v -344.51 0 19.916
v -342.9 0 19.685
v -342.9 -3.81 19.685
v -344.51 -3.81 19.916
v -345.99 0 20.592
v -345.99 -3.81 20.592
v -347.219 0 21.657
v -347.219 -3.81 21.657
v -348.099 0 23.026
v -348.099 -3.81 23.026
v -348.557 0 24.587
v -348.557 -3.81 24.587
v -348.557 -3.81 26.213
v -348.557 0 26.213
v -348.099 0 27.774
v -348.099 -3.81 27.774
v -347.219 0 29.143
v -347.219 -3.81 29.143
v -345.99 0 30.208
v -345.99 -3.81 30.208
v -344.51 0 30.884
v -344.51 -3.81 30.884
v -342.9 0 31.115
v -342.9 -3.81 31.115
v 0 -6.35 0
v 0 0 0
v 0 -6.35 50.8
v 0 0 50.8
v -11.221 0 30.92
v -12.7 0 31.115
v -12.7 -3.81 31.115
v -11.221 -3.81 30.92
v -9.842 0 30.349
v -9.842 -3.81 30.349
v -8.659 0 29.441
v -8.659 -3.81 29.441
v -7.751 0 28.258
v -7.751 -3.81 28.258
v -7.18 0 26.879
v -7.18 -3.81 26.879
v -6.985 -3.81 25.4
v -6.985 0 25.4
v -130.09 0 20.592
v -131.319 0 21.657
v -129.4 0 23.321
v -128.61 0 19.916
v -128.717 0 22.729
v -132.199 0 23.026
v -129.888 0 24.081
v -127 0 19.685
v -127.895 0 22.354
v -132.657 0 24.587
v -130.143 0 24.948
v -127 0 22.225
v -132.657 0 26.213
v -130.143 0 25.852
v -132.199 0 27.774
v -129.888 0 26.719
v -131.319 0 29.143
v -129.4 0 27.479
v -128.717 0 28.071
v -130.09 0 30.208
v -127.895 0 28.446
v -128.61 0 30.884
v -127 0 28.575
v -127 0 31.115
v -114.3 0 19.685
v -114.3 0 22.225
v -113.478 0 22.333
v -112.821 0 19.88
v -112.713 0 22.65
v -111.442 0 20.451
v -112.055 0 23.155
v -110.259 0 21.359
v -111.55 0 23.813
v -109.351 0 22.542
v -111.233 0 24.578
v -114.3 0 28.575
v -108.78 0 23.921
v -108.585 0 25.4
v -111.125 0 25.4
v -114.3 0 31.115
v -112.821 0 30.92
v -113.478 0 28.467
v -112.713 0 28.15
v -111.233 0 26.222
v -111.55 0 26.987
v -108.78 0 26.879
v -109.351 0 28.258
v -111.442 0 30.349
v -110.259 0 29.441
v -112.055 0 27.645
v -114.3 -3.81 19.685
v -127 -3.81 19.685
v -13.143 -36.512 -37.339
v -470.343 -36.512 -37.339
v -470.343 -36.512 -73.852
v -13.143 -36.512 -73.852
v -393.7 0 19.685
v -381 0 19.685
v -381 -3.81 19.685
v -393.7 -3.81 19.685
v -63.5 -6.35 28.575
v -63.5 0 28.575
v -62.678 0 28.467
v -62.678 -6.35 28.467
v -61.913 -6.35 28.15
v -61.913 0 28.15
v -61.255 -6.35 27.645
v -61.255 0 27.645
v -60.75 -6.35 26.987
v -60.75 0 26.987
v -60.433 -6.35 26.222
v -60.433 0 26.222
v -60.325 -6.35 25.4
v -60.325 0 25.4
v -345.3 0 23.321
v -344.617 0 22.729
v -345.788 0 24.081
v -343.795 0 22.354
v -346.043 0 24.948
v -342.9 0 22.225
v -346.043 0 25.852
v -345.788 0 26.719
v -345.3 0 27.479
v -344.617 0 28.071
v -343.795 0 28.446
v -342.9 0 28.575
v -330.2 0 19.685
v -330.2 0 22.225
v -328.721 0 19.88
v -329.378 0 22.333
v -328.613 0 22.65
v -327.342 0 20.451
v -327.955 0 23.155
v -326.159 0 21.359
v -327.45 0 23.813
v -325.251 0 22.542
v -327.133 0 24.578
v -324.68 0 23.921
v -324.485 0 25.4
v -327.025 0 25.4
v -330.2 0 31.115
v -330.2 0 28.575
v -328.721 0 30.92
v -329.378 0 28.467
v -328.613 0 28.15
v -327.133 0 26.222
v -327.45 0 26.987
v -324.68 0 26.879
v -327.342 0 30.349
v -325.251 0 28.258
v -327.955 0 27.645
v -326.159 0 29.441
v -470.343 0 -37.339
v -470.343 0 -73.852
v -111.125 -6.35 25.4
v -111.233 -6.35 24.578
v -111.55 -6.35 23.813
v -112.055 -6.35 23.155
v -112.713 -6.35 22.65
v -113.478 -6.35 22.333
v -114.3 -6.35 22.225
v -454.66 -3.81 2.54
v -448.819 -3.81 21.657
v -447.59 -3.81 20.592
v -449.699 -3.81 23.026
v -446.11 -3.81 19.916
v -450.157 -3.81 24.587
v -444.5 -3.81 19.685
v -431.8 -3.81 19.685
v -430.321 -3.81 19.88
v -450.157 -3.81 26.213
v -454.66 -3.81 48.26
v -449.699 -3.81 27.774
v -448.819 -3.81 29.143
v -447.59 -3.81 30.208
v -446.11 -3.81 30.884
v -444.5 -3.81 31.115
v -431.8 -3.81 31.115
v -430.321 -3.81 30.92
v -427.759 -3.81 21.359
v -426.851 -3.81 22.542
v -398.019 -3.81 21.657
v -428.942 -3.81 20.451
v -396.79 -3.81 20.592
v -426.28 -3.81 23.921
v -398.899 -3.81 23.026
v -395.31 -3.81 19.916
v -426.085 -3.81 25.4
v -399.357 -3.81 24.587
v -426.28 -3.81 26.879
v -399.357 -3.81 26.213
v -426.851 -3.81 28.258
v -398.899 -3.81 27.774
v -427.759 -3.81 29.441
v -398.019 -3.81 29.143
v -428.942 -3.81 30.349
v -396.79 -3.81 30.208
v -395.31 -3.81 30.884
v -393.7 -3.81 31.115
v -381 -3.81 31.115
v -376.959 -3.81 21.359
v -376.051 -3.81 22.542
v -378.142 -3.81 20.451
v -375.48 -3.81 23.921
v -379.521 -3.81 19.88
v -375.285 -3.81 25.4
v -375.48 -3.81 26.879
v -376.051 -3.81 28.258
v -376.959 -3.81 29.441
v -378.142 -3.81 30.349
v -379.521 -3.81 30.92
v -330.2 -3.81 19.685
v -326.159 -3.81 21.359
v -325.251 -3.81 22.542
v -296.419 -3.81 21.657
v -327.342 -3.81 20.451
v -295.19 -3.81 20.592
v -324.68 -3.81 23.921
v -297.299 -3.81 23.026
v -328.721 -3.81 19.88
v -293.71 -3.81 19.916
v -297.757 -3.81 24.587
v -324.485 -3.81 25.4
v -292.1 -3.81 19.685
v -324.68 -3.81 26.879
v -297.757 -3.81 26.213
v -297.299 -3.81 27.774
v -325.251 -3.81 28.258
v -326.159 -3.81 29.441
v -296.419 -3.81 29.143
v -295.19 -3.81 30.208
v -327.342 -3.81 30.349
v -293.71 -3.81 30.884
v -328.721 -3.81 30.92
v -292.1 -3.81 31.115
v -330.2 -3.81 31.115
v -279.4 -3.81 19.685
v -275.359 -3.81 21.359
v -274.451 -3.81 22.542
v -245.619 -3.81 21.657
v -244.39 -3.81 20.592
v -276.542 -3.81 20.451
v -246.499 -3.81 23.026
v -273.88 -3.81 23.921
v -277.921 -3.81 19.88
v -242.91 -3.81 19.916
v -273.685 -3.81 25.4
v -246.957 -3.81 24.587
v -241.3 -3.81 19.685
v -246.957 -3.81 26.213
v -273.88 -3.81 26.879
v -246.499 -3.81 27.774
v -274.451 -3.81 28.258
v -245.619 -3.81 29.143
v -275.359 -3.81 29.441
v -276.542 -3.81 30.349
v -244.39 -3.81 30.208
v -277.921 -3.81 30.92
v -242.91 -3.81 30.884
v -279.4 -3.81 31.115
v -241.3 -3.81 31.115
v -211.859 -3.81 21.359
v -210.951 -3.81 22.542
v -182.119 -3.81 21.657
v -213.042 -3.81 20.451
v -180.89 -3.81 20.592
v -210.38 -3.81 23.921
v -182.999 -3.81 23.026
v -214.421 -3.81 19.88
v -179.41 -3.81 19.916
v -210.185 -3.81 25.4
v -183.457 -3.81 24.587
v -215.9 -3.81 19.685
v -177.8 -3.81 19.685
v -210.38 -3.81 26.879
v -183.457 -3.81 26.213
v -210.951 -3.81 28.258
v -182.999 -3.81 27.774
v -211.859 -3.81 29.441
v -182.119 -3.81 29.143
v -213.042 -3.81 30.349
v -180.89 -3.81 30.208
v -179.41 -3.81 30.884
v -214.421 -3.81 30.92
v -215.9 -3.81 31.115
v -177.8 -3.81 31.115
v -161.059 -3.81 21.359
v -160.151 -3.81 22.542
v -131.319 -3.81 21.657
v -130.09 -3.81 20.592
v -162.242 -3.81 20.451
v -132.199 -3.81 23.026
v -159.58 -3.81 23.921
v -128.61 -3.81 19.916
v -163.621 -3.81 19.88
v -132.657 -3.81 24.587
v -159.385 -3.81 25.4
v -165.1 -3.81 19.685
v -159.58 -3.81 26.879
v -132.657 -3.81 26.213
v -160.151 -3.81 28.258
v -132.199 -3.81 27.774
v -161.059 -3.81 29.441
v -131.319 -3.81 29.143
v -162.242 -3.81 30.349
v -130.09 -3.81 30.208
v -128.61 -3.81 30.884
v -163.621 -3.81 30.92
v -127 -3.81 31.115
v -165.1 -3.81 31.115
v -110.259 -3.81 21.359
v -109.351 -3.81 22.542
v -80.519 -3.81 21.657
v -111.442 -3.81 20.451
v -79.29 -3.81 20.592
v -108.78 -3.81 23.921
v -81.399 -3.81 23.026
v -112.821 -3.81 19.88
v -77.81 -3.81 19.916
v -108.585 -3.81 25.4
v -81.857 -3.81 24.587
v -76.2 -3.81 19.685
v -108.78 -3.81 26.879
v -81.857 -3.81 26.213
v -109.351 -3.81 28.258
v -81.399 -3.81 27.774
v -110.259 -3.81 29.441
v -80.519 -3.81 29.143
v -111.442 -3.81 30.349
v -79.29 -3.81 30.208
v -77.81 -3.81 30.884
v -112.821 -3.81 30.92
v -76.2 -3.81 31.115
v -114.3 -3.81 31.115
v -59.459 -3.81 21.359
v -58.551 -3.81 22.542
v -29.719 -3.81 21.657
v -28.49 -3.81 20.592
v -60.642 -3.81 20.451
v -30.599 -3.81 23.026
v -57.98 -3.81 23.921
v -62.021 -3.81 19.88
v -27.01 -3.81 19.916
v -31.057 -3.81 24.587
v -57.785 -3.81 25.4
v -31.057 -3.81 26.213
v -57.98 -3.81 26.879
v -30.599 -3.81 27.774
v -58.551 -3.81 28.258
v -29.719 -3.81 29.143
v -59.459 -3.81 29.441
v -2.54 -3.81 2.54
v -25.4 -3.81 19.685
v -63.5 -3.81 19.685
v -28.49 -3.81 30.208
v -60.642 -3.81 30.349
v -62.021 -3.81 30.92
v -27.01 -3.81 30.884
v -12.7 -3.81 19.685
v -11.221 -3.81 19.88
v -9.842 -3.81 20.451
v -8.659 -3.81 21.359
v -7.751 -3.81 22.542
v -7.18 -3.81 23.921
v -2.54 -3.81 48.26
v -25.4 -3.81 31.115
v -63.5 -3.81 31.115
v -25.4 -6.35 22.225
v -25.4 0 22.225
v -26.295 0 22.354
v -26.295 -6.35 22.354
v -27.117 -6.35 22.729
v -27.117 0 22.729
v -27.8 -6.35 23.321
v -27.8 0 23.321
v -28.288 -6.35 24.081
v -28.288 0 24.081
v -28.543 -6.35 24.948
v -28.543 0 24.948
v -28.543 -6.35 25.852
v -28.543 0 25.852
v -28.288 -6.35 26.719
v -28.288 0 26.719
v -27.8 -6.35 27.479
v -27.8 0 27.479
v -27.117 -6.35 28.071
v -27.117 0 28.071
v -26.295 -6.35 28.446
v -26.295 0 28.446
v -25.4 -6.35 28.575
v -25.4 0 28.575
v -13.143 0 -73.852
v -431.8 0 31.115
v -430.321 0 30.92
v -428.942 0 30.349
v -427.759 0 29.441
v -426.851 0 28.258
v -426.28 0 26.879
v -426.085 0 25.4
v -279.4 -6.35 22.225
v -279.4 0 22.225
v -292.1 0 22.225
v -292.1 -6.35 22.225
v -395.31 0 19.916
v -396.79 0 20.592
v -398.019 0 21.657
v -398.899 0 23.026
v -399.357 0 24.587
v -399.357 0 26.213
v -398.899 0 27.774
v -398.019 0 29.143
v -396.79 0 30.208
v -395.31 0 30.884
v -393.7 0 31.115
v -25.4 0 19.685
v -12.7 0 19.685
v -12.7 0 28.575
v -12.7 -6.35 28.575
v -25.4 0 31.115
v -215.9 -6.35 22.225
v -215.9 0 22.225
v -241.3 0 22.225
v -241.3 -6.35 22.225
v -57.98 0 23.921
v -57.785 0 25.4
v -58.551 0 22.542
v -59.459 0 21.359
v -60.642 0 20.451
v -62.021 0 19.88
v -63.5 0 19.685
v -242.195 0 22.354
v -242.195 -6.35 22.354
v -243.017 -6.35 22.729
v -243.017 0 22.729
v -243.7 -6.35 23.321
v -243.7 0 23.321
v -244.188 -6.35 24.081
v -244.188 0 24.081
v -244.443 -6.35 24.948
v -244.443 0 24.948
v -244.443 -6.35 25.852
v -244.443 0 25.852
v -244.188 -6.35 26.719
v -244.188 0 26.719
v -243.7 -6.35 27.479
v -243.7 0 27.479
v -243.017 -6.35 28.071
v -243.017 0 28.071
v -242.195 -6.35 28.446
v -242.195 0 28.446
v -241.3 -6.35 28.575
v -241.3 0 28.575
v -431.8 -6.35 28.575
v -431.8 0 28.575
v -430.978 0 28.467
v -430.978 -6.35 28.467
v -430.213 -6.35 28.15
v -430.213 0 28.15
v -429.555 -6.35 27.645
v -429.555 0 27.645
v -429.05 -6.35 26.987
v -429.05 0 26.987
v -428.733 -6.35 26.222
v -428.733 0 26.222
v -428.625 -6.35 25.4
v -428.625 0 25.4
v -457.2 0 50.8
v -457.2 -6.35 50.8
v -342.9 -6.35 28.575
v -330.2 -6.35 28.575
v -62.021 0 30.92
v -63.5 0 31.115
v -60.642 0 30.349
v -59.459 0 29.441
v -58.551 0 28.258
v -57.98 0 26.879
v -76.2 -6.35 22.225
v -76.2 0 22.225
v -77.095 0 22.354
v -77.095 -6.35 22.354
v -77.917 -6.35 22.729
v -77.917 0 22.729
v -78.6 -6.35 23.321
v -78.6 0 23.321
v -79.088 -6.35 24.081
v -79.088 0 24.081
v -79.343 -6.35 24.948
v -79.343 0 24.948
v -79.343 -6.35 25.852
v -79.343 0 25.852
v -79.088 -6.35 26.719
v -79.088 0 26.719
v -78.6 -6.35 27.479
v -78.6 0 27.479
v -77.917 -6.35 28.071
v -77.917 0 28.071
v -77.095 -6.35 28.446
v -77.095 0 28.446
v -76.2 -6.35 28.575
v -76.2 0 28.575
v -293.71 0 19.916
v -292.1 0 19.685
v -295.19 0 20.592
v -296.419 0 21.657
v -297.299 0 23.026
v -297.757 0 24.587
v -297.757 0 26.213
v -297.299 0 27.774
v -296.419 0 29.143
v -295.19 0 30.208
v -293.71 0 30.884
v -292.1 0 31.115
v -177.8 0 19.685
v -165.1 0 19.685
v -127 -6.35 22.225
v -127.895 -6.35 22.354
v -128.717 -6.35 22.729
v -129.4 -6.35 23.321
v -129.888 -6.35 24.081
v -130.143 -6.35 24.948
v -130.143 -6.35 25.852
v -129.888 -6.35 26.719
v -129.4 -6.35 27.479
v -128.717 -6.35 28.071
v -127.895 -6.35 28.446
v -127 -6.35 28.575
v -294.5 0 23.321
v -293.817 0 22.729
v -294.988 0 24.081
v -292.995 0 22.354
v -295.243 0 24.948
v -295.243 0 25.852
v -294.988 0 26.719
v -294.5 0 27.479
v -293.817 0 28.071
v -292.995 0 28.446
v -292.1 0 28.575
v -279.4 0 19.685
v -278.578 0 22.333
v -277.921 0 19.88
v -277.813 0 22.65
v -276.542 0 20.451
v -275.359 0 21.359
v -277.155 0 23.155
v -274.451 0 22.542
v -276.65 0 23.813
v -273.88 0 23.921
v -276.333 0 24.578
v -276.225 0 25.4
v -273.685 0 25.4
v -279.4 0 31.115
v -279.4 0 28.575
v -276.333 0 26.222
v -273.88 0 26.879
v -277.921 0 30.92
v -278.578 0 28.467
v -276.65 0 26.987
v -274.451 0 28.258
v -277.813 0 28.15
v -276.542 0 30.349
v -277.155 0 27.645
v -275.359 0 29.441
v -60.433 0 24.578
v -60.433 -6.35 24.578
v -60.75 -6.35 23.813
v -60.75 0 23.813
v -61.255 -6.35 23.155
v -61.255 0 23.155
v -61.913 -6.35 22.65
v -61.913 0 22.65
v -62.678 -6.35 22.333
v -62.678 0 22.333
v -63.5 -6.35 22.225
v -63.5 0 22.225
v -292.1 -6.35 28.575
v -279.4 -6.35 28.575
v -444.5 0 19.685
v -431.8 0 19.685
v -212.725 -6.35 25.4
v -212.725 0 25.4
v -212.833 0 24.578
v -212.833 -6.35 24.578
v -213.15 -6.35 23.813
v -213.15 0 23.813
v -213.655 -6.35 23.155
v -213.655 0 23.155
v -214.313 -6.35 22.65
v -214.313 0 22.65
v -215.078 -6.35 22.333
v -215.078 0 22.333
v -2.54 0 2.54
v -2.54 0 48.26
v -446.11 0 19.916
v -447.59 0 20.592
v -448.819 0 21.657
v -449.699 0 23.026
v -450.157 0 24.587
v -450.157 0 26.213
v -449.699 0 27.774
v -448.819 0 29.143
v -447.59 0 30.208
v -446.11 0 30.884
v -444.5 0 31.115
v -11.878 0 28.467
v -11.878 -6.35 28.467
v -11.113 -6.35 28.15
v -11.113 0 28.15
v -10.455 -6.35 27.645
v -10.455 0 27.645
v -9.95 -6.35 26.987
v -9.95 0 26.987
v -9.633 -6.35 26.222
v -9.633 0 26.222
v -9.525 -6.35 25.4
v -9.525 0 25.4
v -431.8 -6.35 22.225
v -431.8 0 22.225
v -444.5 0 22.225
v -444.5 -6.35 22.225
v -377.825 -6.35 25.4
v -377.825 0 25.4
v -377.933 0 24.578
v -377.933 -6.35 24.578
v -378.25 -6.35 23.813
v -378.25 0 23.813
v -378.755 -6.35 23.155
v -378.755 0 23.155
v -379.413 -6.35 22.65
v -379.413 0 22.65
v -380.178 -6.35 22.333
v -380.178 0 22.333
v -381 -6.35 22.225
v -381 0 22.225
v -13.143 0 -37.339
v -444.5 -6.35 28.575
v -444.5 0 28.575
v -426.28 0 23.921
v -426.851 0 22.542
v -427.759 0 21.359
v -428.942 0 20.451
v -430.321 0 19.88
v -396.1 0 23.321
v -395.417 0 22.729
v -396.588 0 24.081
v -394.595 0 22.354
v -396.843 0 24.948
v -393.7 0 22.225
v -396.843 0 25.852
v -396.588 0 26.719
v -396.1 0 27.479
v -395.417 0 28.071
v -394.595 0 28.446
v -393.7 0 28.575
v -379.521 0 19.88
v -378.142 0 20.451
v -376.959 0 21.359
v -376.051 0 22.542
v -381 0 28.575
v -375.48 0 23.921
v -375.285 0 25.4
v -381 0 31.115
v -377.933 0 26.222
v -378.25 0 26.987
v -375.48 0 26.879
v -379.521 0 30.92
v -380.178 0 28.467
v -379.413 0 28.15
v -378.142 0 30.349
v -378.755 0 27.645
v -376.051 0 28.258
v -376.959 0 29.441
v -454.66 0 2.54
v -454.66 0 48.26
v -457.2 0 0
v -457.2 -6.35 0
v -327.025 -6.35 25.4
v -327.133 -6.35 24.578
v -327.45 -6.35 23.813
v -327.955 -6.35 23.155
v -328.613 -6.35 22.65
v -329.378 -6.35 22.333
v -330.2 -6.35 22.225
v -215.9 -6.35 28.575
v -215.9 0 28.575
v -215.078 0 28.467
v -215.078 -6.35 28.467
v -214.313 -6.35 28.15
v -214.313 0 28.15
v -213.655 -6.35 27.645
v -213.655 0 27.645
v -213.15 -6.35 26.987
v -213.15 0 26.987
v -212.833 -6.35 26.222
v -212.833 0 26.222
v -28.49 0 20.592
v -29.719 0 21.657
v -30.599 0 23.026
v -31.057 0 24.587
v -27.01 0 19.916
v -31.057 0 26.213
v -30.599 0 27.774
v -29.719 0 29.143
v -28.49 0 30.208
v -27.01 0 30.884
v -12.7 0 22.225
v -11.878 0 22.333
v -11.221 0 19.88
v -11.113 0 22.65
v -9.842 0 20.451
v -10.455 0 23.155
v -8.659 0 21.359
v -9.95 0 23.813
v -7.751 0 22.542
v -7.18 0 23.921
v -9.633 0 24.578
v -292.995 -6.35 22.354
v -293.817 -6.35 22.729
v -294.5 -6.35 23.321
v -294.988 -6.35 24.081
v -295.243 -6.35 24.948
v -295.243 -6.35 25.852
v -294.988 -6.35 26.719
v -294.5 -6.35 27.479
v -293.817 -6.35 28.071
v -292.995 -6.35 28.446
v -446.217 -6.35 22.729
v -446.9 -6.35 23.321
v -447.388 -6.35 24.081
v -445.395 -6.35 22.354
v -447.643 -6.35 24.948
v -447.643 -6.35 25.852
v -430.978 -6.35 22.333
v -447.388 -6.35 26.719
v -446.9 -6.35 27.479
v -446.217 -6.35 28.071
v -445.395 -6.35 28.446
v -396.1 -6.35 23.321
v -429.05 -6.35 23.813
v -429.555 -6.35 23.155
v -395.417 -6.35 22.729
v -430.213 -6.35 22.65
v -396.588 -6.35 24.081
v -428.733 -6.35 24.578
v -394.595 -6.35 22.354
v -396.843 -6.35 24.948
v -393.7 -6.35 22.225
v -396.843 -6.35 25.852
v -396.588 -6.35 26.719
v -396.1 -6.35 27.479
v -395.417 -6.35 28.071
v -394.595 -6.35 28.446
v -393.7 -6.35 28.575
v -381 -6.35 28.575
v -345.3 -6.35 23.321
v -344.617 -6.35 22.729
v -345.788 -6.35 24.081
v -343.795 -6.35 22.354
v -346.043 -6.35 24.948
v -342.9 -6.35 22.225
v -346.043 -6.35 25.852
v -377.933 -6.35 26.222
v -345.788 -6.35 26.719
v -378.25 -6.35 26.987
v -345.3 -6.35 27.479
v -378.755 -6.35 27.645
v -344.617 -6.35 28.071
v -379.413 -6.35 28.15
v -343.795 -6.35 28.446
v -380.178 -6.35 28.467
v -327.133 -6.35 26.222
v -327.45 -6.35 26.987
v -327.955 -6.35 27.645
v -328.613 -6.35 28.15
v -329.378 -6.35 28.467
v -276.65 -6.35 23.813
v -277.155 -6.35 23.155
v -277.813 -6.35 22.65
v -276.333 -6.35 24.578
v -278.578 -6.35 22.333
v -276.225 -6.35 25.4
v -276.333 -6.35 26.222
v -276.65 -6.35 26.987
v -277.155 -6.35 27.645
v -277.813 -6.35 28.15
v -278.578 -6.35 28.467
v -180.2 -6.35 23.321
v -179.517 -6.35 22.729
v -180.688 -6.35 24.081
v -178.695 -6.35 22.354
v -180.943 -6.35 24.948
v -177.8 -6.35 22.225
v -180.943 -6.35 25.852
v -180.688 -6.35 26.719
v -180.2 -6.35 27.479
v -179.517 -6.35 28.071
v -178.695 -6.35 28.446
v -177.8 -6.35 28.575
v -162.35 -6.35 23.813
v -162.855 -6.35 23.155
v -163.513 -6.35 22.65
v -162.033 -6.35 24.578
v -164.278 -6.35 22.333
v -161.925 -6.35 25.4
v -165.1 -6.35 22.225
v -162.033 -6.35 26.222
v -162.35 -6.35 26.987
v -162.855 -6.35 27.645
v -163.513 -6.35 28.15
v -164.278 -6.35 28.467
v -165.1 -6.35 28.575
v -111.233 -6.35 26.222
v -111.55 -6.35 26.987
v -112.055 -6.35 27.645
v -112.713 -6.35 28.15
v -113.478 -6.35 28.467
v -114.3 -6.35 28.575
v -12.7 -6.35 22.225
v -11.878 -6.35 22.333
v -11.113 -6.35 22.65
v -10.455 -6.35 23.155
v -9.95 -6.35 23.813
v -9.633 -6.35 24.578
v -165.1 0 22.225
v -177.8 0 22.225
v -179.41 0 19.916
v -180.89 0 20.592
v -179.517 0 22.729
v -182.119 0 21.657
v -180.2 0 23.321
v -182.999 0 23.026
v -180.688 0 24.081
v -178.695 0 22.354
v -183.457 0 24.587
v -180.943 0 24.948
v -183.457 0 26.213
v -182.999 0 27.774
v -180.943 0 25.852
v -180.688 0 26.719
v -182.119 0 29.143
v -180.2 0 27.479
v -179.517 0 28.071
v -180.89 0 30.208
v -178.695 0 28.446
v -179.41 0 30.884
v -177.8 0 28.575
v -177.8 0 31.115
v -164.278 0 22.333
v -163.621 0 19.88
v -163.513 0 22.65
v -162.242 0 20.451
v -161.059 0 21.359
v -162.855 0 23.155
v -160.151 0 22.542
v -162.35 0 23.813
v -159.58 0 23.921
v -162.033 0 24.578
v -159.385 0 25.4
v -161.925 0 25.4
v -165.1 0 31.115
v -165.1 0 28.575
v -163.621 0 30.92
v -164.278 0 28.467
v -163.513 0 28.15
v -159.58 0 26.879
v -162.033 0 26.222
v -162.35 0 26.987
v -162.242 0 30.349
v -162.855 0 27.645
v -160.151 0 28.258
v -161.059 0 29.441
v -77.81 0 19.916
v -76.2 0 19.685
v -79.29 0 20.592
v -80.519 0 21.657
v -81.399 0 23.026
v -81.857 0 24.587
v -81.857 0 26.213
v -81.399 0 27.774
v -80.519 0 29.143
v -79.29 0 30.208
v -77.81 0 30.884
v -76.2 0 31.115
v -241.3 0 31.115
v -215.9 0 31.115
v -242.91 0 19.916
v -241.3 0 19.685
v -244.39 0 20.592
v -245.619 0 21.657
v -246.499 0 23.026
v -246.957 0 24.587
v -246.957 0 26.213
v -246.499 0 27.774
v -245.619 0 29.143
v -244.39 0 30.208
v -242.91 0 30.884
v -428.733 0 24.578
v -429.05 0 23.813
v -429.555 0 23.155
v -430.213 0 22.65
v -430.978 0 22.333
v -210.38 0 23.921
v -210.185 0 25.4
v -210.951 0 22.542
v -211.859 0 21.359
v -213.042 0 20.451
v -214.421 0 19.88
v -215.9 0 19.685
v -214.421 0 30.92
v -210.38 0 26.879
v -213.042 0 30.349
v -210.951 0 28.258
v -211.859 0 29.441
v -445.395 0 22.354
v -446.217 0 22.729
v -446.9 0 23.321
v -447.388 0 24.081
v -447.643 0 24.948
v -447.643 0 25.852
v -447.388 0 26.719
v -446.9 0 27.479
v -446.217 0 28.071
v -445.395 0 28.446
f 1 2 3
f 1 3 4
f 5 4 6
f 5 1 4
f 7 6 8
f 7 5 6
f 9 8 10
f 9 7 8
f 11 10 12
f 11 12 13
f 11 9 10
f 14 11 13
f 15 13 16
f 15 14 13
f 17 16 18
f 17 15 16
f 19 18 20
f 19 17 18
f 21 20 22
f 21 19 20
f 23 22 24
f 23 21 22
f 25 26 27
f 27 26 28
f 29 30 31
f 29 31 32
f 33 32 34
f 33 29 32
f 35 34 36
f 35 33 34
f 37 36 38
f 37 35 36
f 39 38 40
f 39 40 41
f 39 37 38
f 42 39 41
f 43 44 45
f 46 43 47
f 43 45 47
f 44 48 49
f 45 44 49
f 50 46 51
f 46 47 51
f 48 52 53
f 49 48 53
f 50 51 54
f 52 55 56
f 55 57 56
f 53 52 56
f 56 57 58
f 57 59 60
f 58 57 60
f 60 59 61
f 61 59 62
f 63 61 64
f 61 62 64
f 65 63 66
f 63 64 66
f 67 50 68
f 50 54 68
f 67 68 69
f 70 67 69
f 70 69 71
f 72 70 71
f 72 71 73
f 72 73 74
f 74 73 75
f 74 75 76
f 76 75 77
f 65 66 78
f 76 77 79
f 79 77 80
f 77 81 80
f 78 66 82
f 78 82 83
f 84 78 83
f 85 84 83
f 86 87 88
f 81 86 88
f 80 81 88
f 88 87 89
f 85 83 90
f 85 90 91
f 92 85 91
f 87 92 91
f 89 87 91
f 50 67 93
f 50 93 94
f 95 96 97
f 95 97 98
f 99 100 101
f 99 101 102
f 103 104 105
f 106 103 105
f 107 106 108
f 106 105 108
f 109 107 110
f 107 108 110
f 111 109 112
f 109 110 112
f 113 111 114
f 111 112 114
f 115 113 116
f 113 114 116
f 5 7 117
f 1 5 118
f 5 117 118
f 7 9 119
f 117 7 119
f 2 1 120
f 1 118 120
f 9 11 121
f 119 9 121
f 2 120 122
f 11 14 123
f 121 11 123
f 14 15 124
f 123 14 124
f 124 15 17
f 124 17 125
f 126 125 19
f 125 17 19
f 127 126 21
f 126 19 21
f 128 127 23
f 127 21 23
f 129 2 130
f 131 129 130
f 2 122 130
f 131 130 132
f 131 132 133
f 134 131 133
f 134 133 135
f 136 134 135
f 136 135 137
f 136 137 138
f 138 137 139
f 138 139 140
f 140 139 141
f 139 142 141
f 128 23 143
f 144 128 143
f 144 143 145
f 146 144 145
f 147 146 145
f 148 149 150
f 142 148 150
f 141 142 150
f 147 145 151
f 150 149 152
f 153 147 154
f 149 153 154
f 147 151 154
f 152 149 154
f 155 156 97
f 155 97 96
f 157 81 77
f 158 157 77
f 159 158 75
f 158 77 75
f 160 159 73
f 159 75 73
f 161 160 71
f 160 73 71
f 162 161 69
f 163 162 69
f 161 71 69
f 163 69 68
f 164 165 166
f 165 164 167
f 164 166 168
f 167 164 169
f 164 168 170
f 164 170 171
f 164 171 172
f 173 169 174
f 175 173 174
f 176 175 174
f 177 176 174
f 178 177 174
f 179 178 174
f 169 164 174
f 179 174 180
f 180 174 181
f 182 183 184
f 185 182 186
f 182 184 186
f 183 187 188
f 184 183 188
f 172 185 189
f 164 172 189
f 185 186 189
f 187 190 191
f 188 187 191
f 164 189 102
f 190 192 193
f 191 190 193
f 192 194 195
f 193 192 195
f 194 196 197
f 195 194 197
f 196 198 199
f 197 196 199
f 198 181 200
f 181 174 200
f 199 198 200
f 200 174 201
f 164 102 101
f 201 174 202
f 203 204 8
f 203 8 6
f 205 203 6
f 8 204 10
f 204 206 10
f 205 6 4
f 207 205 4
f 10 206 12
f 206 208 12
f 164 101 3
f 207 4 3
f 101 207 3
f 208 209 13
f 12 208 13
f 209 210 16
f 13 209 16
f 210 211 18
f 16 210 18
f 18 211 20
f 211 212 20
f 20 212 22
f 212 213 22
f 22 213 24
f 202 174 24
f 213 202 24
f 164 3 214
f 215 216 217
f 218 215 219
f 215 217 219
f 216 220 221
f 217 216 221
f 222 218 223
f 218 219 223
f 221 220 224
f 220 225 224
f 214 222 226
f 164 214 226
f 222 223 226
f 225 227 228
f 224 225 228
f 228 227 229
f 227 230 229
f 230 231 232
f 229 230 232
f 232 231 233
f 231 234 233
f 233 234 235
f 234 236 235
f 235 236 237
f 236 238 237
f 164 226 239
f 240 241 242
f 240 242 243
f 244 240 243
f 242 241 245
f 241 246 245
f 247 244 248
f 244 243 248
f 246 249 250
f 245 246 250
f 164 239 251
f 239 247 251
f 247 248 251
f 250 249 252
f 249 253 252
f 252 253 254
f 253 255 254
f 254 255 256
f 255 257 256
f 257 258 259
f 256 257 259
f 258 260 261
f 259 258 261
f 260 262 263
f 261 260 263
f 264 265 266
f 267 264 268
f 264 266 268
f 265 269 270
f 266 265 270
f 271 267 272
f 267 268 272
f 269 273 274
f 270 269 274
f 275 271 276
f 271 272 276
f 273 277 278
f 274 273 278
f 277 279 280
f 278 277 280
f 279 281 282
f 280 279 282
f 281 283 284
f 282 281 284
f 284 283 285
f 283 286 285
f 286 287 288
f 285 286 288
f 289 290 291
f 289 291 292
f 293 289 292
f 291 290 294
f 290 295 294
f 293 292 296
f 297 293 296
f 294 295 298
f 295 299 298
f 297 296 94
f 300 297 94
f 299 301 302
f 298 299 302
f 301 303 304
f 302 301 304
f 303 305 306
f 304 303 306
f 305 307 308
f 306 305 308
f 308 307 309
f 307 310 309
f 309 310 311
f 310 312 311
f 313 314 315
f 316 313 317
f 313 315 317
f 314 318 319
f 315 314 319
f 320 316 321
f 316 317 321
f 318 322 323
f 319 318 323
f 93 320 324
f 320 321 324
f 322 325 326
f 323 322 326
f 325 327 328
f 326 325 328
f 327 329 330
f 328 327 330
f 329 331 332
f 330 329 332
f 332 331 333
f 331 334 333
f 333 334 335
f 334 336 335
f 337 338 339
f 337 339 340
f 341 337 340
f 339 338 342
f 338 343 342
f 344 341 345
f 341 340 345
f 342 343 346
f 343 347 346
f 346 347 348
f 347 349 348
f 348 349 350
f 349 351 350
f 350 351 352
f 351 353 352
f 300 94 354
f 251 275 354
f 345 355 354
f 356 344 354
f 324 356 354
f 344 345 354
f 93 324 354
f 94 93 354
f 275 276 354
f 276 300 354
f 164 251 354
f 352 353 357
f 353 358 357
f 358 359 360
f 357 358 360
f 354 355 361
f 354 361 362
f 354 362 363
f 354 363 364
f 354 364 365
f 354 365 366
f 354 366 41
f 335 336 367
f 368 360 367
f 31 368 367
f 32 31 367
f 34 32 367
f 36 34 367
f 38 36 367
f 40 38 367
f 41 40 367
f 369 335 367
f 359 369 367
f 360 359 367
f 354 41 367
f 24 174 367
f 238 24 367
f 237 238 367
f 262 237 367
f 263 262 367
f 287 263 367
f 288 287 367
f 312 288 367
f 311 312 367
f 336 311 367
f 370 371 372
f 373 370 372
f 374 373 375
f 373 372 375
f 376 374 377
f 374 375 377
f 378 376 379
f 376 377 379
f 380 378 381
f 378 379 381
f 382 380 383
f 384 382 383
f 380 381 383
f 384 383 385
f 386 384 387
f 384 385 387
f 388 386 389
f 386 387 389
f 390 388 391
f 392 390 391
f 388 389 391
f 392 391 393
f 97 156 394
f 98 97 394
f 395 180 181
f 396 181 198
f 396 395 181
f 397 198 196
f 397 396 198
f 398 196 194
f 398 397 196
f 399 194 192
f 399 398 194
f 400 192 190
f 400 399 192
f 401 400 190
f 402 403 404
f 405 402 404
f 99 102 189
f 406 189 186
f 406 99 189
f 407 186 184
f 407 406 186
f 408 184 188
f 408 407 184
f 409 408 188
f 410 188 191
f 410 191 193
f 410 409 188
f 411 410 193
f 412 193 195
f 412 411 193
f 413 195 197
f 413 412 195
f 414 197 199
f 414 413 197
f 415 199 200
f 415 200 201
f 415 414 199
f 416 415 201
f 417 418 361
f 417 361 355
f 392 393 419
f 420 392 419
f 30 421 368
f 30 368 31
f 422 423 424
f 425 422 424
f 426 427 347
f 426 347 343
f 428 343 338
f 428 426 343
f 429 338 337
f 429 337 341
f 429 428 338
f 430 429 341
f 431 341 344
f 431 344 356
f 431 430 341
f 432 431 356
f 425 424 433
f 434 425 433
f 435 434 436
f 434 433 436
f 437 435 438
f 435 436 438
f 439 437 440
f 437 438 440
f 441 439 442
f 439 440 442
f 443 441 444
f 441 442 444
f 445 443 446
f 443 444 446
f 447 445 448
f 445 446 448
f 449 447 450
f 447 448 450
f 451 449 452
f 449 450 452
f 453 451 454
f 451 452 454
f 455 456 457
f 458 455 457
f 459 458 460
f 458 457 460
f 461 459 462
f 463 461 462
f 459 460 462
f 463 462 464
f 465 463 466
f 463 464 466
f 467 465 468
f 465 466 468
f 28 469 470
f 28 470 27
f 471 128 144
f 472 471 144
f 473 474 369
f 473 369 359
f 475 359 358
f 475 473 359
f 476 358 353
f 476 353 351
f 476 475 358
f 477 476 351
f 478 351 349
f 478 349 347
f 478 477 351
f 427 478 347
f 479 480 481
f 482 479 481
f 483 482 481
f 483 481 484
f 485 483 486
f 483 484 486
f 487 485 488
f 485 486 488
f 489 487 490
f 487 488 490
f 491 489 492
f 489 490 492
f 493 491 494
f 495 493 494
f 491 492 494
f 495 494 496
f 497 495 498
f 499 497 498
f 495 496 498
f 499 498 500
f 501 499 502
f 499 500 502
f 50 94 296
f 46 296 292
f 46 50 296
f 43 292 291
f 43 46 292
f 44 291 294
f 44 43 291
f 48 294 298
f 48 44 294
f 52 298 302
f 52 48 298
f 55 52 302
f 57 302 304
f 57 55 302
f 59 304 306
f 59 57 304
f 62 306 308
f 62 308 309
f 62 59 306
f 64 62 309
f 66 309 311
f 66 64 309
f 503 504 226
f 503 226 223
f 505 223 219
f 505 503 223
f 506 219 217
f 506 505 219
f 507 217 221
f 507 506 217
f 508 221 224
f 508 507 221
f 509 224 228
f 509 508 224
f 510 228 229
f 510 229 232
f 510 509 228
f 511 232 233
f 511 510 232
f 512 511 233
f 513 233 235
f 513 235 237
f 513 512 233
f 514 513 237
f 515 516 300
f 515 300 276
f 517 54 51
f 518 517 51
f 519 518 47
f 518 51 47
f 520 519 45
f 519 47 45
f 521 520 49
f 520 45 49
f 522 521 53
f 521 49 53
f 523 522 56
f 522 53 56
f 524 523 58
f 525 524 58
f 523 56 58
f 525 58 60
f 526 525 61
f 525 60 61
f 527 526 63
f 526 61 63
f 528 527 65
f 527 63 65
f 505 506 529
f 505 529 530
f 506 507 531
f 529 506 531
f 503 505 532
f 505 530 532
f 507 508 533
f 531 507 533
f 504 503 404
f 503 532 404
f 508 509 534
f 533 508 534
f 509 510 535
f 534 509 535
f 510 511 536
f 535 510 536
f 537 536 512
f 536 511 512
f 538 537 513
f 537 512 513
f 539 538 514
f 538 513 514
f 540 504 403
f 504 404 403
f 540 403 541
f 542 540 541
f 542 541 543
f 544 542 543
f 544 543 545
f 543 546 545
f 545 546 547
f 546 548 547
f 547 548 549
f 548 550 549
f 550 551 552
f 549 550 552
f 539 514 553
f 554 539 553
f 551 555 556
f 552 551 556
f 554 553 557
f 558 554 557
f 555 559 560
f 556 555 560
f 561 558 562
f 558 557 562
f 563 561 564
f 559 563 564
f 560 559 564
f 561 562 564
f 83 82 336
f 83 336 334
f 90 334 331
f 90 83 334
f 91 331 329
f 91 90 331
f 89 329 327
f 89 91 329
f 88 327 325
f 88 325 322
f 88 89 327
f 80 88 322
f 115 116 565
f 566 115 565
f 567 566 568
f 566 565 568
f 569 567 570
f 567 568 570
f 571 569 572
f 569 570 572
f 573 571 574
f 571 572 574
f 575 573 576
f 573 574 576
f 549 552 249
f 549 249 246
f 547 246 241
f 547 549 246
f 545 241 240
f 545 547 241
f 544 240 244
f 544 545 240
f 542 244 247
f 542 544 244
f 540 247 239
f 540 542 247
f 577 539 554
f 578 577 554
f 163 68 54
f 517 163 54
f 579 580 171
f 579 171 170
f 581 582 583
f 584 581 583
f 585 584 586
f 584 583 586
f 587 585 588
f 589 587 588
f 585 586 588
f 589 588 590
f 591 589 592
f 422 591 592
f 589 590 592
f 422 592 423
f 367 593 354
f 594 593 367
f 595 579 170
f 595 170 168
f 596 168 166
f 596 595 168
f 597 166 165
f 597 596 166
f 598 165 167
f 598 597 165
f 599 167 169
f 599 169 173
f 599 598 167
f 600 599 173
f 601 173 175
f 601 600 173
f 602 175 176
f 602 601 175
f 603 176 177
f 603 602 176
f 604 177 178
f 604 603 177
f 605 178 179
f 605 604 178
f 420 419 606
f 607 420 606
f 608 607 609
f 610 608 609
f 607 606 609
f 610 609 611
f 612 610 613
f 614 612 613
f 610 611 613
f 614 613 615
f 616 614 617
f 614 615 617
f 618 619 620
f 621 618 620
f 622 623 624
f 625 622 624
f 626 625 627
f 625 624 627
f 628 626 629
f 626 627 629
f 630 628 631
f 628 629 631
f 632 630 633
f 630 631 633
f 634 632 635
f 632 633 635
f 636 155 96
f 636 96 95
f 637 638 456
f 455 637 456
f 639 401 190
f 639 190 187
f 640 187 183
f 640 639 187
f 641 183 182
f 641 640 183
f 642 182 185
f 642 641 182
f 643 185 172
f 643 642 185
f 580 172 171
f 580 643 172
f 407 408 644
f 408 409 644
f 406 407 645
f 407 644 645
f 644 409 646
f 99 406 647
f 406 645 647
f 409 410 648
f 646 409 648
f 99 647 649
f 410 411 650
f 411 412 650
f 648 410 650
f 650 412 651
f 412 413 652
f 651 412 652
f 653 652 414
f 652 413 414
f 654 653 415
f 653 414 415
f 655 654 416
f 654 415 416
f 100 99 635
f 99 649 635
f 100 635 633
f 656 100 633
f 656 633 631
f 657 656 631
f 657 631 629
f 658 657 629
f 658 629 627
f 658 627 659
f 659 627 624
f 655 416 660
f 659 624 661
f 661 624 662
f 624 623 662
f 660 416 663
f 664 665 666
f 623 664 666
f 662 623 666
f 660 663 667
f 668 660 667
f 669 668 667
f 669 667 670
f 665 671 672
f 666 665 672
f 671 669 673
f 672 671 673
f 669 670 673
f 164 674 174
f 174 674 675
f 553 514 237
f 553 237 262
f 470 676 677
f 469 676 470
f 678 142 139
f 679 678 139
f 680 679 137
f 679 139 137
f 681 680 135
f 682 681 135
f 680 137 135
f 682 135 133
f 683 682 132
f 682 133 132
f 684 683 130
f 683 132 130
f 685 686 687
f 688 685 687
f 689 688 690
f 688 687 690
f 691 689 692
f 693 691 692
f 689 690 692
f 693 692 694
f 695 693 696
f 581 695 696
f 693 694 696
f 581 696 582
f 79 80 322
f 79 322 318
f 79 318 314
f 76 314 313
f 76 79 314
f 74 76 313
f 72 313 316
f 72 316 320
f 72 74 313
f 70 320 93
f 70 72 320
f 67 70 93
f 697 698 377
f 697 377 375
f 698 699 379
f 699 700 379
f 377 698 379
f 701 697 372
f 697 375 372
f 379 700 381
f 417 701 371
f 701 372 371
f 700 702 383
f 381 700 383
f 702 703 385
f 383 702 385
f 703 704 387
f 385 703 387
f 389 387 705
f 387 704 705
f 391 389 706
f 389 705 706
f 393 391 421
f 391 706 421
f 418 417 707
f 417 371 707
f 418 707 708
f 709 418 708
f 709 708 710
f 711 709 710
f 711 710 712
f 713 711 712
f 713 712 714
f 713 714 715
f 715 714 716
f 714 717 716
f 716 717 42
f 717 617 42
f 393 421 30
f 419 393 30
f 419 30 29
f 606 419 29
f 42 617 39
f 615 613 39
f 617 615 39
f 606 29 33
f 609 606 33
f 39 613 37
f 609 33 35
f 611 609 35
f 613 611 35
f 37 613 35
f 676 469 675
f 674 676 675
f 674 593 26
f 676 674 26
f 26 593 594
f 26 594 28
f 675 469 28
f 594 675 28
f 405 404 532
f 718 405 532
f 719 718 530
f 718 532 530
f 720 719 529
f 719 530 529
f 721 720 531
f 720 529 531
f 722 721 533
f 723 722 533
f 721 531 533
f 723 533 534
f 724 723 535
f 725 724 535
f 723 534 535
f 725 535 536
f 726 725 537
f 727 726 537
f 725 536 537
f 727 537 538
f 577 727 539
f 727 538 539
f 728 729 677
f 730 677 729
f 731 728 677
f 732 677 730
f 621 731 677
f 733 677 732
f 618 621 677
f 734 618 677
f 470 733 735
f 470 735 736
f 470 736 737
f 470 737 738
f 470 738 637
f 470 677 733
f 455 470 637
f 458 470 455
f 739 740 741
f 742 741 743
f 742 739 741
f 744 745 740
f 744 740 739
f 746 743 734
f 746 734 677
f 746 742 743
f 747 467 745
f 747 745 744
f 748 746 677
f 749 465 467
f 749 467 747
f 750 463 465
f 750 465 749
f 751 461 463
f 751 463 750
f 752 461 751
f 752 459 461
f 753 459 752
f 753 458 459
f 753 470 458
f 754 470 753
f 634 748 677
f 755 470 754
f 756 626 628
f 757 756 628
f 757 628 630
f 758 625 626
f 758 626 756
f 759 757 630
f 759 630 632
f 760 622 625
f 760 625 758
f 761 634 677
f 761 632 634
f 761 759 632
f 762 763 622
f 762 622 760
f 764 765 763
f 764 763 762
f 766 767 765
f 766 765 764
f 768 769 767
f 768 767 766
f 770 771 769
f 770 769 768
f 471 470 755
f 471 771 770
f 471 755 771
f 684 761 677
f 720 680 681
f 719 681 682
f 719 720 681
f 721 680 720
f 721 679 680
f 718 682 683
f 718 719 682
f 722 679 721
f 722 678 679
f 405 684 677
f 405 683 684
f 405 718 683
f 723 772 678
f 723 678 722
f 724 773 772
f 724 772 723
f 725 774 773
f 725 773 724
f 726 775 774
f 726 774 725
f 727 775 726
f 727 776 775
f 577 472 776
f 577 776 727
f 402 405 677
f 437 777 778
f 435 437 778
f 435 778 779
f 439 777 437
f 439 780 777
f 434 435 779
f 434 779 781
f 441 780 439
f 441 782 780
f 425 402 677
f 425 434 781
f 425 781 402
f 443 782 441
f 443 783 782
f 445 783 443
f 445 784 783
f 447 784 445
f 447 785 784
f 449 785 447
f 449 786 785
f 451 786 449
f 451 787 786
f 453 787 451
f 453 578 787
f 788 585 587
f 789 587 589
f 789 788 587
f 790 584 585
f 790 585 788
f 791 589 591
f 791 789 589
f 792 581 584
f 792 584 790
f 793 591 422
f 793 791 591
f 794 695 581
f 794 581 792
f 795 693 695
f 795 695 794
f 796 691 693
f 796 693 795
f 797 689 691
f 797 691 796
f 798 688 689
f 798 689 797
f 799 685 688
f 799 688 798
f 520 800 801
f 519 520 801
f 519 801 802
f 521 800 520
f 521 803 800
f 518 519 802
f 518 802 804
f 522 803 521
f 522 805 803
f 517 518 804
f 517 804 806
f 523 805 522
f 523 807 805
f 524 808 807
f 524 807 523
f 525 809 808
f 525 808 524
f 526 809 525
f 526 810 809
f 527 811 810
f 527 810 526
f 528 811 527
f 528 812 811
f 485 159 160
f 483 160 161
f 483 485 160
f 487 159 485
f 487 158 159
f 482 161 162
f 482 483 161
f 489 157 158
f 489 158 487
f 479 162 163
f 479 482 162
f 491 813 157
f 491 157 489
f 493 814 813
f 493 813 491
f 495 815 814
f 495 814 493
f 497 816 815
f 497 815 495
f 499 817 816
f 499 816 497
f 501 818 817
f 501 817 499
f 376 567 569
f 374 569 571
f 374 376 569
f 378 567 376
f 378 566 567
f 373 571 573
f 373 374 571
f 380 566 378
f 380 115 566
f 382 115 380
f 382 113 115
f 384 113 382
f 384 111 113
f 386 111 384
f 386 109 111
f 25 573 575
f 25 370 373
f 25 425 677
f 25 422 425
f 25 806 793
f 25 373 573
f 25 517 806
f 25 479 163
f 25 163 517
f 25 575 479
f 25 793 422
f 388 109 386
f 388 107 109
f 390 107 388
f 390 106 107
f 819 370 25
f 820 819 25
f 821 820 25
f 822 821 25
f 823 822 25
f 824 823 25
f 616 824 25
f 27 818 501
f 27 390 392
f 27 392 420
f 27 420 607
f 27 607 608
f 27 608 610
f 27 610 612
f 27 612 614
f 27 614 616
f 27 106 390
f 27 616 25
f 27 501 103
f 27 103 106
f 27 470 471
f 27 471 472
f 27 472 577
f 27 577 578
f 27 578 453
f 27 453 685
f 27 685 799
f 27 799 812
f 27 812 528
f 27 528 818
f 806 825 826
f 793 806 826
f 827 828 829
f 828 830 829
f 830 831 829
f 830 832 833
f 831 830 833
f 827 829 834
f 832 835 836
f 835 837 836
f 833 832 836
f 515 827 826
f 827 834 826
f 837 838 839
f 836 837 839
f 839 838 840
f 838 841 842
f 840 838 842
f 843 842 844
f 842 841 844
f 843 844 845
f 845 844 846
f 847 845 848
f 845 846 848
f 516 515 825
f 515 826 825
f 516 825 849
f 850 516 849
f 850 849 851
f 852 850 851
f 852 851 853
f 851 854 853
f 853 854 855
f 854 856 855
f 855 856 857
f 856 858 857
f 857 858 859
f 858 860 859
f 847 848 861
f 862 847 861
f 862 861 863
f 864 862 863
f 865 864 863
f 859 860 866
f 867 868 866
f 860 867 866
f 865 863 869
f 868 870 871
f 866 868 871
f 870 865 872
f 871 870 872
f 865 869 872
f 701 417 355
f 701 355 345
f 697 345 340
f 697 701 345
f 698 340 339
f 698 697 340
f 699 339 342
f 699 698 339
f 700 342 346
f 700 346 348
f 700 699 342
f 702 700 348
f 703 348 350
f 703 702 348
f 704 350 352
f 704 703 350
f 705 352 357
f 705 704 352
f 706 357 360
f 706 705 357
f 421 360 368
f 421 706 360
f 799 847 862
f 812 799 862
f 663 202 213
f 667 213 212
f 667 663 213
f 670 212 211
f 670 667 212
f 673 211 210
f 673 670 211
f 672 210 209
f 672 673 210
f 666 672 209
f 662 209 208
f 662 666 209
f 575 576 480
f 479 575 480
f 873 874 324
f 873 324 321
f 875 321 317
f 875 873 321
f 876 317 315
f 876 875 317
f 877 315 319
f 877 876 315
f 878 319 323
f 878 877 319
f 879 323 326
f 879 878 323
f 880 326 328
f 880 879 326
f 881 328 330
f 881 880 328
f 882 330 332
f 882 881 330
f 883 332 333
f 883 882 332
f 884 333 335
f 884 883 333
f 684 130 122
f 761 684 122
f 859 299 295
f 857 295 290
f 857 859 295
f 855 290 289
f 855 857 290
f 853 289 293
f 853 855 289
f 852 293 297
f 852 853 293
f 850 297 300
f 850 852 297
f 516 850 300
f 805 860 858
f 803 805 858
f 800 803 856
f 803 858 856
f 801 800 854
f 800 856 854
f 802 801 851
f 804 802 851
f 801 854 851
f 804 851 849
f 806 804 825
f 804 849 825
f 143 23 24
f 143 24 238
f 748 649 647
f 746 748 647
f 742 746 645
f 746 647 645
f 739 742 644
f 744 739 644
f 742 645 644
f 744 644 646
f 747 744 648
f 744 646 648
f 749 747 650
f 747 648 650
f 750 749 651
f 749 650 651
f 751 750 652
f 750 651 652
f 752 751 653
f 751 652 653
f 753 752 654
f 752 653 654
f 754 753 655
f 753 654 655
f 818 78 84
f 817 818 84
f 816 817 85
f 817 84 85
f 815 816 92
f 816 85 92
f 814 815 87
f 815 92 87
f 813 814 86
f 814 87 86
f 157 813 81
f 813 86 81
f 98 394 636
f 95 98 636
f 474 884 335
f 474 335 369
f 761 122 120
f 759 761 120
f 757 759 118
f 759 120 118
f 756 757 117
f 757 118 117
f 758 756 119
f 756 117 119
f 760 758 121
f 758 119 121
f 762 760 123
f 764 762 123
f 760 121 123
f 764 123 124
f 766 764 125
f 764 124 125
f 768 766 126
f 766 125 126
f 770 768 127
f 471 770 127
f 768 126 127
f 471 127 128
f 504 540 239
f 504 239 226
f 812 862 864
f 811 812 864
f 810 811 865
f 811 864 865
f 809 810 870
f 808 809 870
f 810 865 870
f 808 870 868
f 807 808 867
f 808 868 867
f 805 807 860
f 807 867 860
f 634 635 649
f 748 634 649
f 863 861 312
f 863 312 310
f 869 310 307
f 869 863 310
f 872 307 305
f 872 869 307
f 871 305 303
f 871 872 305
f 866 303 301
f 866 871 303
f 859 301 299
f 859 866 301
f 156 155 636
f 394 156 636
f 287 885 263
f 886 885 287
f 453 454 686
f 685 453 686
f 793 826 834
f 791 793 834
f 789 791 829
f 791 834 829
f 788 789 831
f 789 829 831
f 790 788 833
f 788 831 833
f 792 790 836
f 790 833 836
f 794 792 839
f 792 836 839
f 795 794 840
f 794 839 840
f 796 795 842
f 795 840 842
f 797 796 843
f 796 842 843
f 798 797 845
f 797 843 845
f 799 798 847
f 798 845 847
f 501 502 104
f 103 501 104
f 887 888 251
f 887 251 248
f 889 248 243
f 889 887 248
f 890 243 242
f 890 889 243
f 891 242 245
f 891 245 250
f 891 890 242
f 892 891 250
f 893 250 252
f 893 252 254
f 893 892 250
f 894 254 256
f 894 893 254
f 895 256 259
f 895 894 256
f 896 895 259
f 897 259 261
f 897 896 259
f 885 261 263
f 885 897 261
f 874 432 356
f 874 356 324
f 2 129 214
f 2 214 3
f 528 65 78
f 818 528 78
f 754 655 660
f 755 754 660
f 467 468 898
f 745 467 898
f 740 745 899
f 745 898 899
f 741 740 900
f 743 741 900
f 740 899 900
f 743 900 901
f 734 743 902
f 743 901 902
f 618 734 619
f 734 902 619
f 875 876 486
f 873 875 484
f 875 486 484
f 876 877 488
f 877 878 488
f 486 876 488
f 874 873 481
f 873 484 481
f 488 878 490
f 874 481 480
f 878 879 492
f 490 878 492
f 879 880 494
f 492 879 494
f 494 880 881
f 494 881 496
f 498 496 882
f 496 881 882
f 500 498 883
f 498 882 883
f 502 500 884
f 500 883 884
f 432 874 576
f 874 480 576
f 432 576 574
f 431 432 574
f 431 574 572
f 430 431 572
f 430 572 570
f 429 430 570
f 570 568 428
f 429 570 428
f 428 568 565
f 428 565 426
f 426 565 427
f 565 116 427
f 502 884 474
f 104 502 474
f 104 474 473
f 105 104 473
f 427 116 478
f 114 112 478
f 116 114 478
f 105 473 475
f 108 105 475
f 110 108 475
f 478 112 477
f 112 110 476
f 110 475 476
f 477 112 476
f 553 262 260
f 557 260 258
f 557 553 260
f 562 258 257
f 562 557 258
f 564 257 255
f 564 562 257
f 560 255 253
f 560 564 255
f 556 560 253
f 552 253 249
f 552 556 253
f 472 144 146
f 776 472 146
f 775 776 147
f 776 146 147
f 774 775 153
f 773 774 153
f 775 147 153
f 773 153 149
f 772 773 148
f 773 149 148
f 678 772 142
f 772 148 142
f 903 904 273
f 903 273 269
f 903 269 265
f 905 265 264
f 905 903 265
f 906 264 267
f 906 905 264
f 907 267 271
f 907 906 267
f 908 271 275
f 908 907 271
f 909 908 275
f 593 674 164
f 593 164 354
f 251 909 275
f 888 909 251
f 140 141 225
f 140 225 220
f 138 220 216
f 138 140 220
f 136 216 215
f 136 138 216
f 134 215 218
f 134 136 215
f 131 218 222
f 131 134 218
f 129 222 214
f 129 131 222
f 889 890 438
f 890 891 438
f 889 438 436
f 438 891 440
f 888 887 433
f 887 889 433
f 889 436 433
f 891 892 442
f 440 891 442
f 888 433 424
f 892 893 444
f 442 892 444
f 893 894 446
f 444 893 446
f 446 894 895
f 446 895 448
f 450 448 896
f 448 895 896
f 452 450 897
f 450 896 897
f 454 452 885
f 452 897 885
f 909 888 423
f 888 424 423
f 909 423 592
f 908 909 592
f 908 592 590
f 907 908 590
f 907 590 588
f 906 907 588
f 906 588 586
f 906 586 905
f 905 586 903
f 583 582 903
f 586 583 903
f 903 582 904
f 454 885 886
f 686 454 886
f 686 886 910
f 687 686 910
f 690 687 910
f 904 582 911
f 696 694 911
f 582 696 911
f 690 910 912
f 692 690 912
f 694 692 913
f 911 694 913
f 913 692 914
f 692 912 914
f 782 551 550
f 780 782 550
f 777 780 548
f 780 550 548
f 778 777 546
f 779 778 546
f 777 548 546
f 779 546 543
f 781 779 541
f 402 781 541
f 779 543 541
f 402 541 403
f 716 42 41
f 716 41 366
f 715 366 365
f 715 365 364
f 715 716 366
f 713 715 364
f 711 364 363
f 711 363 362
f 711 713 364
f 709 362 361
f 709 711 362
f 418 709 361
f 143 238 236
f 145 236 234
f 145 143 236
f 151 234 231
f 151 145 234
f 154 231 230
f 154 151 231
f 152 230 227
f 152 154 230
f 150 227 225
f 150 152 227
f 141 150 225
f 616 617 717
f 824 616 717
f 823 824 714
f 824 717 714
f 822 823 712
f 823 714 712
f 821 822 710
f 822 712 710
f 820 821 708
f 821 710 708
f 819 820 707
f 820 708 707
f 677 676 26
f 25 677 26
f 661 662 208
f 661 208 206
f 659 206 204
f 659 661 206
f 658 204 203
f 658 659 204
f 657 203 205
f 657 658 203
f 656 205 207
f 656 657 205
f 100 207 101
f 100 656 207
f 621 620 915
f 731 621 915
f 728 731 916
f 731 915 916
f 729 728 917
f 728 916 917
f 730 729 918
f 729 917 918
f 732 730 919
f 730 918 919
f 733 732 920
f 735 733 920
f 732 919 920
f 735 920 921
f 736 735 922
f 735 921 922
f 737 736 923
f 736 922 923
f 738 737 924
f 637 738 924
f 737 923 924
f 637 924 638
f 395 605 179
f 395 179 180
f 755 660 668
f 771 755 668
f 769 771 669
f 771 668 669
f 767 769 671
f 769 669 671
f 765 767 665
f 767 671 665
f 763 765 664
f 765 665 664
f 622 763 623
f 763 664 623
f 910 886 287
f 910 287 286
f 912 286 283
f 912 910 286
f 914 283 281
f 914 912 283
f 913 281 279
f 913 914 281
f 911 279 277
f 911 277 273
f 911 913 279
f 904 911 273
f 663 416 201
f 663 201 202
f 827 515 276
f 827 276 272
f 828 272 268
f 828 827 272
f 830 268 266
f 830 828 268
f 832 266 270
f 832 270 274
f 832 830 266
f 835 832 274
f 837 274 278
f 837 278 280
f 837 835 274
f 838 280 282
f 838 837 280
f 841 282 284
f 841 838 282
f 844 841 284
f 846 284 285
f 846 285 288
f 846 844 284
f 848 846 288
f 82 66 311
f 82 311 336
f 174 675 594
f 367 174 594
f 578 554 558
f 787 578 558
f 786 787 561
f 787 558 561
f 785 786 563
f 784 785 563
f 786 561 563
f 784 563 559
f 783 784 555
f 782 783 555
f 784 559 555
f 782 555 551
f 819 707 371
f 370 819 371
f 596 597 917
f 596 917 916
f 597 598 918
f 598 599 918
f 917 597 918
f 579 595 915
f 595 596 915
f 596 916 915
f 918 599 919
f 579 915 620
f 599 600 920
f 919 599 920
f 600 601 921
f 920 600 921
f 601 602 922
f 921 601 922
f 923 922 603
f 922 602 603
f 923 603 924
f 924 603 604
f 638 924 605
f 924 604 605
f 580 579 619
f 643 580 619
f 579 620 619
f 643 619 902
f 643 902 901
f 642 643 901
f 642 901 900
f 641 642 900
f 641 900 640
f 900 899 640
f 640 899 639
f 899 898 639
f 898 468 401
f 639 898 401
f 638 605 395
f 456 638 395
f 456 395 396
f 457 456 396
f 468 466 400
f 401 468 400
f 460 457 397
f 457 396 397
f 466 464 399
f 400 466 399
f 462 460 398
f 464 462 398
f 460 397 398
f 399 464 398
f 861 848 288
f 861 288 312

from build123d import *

# Parameters (mm, degrees)
F0_W     = 457.2
F0_H     = 50.8
F1_DEPTH = 6.35
F2_T     = -2.54
F3_W     = 457.2
F3_H     = 36.5125
F4_DEPTH = 36.5125


with BuildPart() as f1:
    # F0 (on Front) → F1 (new body)
    with BuildSketch(Plane.XZ):
        with Locations((-228.6, 25.4)):
            Rectangle(F0_W, F0_H)
        with BuildLine():
            ThreePointArc((-431.8, 28.575), (-429.554936, 27.645064), (-428.625, 25.4))
            ThreePointArc((-428.625, 25.4), (-429.554936, 23.154936), (-431.8, 22.225))
            Line((-431.8, 22.225), (-444.5, 22.225))
            ThreePointArc((-444.5, 22.225), (-447.675, 25.4), (-444.5, 28.575))
            Line((-444.5, 28.575), (-431.8, 28.575))
        make_face(mode=Mode.SUBTRACT)
        with BuildLine():
            ThreePointArc((-381, 28.575), (-378.754936, 27.645064), (-377.825, 25.4))
            ThreePointArc((-377.825, 25.4), (-378.754936, 23.154936), (-381, 22.225))
            Line((-381, 22.225), (-393.7, 22.225))
            ThreePointArc((-393.7, 22.225), (-396.875, 25.4), (-393.7, 28.575))
            Line((-393.7, 28.575), (-381, 28.575))
        make_face(mode=Mode.SUBTRACT)
        with BuildLine():
            ThreePointArc((-330.2, 28.575), (-327.954936, 27.645064), (-327.025, 25.4))
            ThreePointArc((-327.025, 25.4), (-327.954936, 23.154936), (-330.2, 22.225))
            Line((-330.2, 22.225), (-342.9, 22.225))
            ThreePointArc((-342.9, 22.225), (-346.075, 25.4), (-342.9, 28.575))
            Line((-342.9, 28.575), (-330.2, 28.575))
        make_face(mode=Mode.SUBTRACT)
        with BuildLine():
            ThreePointArc((-279.4, 28.575), (-277.154936, 27.645064), (-276.225, 25.4))
            ThreePointArc((-276.225, 25.4), (-277.154936, 23.154936), (-279.4, 22.225))
            Line((-279.4, 22.225), (-292.1, 22.225))
            ThreePointArc((-292.1, 22.225), (-295.275, 25.4), (-292.1, 28.575))
            Line((-292.1, 28.575), (-279.4, 28.575))
        make_face(mode=Mode.SUBTRACT)
        with BuildLine():
            Line((-241.3, 28.575), (-228.6, 28.575))
            Line((-228.6, 28.575), (-215.9, 28.575))
            ThreePointArc((-215.9, 28.575), (-213.654936, 27.645064), (-212.725, 25.4))
            ThreePointArc((-212.725, 25.4), (-213.654936, 23.154936), (-215.9, 22.225))
            Line((-215.9, 22.225), (-228.6, 22.225))
            Line((-228.6, 22.225), (-241.3, 22.225))
            ThreePointArc((-241.3, 22.225), (-244.475, 25.4), (-241.3, 28.575))
        make_face(mode=Mode.SUBTRACT)
        with BuildLine():
            ThreePointArc((-177.8, 22.225), (-180.975, 25.4), (-177.8, 28.575))
            Line((-177.8, 28.575), (-165.1, 28.575))
            ThreePointArc((-165.1, 28.575), (-162.854936, 27.645064), (-161.925, 25.4))
            ThreePointArc((-161.925, 25.4), (-162.854936, 23.154936), (-165.1, 22.225))
            Line((-165.1, 22.225), (-177.8, 22.225))
        make_face(mode=Mode.SUBTRACT)
        with BuildLine():
            ThreePointArc((-114.3, 28.575), (-112.054936, 27.645064), (-111.125, 25.4))
            ThreePointArc((-111.125, 25.4), (-112.054936, 23.154936), (-114.3, 22.225))
            Line((-114.3, 22.225), (-127, 22.225))
            ThreePointArc((-127, 22.225), (-130.175, 25.4), (-127, 28.575))
            Line((-127, 28.575), (-114.3, 28.575))
        make_face(mode=Mode.SUBTRACT)
        with BuildLine():
            ThreePointArc((-76.2, 22.225), (-79.375, 25.4), (-76.2, 28.575))
            Line((-76.2, 28.575), (-63.5, 28.575))
            ThreePointArc((-63.5, 28.575), (-61.254936, 27.645064), (-60.325, 25.4))
            ThreePointArc((-60.325, 25.4), (-61.254936, 23.154936), (-63.5, 22.225))
            Line((-63.5, 22.225), (-76.2, 22.225))
        make_face(mode=Mode.SUBTRACT)
        with BuildLine():
            ThreePointArc((-25.4, 22.225), (-28.575, 25.4), (-25.4, 28.575))
            Line((-25.4, 28.575), (-12.7, 28.575))
            ThreePointArc((-12.7, 28.575), (-10.454936, 27.645064), (-9.525, 25.4))
            ThreePointArc((-9.525, 25.4), (-10.454936, 23.154936), (-12.7, 22.225))
            Line((-12.7, 22.225), (-25.4, 22.225))
        make_face(mode=Mode.SUBTRACT)
    extrude(amount=F1_DEPTH)

    # F2
    f2_openings = [f1.faces().sort_by_distance(p)[0] for p in [
        (-228.6, 0, 46.199864),
    ]]
    offset(amount=F2_T, openings=f2_openings)


with BuildPart() as f4:
    # F3 (on Front) → F4 (new body)
    with BuildSketch(Plane.XZ):
        with Locations((-241.742683, -55.595393)):
            Rectangle(F3_W, F3_H)
    extrude(amount=F4_DEPTH)


solid = Compound([f1.part, f4.part])
